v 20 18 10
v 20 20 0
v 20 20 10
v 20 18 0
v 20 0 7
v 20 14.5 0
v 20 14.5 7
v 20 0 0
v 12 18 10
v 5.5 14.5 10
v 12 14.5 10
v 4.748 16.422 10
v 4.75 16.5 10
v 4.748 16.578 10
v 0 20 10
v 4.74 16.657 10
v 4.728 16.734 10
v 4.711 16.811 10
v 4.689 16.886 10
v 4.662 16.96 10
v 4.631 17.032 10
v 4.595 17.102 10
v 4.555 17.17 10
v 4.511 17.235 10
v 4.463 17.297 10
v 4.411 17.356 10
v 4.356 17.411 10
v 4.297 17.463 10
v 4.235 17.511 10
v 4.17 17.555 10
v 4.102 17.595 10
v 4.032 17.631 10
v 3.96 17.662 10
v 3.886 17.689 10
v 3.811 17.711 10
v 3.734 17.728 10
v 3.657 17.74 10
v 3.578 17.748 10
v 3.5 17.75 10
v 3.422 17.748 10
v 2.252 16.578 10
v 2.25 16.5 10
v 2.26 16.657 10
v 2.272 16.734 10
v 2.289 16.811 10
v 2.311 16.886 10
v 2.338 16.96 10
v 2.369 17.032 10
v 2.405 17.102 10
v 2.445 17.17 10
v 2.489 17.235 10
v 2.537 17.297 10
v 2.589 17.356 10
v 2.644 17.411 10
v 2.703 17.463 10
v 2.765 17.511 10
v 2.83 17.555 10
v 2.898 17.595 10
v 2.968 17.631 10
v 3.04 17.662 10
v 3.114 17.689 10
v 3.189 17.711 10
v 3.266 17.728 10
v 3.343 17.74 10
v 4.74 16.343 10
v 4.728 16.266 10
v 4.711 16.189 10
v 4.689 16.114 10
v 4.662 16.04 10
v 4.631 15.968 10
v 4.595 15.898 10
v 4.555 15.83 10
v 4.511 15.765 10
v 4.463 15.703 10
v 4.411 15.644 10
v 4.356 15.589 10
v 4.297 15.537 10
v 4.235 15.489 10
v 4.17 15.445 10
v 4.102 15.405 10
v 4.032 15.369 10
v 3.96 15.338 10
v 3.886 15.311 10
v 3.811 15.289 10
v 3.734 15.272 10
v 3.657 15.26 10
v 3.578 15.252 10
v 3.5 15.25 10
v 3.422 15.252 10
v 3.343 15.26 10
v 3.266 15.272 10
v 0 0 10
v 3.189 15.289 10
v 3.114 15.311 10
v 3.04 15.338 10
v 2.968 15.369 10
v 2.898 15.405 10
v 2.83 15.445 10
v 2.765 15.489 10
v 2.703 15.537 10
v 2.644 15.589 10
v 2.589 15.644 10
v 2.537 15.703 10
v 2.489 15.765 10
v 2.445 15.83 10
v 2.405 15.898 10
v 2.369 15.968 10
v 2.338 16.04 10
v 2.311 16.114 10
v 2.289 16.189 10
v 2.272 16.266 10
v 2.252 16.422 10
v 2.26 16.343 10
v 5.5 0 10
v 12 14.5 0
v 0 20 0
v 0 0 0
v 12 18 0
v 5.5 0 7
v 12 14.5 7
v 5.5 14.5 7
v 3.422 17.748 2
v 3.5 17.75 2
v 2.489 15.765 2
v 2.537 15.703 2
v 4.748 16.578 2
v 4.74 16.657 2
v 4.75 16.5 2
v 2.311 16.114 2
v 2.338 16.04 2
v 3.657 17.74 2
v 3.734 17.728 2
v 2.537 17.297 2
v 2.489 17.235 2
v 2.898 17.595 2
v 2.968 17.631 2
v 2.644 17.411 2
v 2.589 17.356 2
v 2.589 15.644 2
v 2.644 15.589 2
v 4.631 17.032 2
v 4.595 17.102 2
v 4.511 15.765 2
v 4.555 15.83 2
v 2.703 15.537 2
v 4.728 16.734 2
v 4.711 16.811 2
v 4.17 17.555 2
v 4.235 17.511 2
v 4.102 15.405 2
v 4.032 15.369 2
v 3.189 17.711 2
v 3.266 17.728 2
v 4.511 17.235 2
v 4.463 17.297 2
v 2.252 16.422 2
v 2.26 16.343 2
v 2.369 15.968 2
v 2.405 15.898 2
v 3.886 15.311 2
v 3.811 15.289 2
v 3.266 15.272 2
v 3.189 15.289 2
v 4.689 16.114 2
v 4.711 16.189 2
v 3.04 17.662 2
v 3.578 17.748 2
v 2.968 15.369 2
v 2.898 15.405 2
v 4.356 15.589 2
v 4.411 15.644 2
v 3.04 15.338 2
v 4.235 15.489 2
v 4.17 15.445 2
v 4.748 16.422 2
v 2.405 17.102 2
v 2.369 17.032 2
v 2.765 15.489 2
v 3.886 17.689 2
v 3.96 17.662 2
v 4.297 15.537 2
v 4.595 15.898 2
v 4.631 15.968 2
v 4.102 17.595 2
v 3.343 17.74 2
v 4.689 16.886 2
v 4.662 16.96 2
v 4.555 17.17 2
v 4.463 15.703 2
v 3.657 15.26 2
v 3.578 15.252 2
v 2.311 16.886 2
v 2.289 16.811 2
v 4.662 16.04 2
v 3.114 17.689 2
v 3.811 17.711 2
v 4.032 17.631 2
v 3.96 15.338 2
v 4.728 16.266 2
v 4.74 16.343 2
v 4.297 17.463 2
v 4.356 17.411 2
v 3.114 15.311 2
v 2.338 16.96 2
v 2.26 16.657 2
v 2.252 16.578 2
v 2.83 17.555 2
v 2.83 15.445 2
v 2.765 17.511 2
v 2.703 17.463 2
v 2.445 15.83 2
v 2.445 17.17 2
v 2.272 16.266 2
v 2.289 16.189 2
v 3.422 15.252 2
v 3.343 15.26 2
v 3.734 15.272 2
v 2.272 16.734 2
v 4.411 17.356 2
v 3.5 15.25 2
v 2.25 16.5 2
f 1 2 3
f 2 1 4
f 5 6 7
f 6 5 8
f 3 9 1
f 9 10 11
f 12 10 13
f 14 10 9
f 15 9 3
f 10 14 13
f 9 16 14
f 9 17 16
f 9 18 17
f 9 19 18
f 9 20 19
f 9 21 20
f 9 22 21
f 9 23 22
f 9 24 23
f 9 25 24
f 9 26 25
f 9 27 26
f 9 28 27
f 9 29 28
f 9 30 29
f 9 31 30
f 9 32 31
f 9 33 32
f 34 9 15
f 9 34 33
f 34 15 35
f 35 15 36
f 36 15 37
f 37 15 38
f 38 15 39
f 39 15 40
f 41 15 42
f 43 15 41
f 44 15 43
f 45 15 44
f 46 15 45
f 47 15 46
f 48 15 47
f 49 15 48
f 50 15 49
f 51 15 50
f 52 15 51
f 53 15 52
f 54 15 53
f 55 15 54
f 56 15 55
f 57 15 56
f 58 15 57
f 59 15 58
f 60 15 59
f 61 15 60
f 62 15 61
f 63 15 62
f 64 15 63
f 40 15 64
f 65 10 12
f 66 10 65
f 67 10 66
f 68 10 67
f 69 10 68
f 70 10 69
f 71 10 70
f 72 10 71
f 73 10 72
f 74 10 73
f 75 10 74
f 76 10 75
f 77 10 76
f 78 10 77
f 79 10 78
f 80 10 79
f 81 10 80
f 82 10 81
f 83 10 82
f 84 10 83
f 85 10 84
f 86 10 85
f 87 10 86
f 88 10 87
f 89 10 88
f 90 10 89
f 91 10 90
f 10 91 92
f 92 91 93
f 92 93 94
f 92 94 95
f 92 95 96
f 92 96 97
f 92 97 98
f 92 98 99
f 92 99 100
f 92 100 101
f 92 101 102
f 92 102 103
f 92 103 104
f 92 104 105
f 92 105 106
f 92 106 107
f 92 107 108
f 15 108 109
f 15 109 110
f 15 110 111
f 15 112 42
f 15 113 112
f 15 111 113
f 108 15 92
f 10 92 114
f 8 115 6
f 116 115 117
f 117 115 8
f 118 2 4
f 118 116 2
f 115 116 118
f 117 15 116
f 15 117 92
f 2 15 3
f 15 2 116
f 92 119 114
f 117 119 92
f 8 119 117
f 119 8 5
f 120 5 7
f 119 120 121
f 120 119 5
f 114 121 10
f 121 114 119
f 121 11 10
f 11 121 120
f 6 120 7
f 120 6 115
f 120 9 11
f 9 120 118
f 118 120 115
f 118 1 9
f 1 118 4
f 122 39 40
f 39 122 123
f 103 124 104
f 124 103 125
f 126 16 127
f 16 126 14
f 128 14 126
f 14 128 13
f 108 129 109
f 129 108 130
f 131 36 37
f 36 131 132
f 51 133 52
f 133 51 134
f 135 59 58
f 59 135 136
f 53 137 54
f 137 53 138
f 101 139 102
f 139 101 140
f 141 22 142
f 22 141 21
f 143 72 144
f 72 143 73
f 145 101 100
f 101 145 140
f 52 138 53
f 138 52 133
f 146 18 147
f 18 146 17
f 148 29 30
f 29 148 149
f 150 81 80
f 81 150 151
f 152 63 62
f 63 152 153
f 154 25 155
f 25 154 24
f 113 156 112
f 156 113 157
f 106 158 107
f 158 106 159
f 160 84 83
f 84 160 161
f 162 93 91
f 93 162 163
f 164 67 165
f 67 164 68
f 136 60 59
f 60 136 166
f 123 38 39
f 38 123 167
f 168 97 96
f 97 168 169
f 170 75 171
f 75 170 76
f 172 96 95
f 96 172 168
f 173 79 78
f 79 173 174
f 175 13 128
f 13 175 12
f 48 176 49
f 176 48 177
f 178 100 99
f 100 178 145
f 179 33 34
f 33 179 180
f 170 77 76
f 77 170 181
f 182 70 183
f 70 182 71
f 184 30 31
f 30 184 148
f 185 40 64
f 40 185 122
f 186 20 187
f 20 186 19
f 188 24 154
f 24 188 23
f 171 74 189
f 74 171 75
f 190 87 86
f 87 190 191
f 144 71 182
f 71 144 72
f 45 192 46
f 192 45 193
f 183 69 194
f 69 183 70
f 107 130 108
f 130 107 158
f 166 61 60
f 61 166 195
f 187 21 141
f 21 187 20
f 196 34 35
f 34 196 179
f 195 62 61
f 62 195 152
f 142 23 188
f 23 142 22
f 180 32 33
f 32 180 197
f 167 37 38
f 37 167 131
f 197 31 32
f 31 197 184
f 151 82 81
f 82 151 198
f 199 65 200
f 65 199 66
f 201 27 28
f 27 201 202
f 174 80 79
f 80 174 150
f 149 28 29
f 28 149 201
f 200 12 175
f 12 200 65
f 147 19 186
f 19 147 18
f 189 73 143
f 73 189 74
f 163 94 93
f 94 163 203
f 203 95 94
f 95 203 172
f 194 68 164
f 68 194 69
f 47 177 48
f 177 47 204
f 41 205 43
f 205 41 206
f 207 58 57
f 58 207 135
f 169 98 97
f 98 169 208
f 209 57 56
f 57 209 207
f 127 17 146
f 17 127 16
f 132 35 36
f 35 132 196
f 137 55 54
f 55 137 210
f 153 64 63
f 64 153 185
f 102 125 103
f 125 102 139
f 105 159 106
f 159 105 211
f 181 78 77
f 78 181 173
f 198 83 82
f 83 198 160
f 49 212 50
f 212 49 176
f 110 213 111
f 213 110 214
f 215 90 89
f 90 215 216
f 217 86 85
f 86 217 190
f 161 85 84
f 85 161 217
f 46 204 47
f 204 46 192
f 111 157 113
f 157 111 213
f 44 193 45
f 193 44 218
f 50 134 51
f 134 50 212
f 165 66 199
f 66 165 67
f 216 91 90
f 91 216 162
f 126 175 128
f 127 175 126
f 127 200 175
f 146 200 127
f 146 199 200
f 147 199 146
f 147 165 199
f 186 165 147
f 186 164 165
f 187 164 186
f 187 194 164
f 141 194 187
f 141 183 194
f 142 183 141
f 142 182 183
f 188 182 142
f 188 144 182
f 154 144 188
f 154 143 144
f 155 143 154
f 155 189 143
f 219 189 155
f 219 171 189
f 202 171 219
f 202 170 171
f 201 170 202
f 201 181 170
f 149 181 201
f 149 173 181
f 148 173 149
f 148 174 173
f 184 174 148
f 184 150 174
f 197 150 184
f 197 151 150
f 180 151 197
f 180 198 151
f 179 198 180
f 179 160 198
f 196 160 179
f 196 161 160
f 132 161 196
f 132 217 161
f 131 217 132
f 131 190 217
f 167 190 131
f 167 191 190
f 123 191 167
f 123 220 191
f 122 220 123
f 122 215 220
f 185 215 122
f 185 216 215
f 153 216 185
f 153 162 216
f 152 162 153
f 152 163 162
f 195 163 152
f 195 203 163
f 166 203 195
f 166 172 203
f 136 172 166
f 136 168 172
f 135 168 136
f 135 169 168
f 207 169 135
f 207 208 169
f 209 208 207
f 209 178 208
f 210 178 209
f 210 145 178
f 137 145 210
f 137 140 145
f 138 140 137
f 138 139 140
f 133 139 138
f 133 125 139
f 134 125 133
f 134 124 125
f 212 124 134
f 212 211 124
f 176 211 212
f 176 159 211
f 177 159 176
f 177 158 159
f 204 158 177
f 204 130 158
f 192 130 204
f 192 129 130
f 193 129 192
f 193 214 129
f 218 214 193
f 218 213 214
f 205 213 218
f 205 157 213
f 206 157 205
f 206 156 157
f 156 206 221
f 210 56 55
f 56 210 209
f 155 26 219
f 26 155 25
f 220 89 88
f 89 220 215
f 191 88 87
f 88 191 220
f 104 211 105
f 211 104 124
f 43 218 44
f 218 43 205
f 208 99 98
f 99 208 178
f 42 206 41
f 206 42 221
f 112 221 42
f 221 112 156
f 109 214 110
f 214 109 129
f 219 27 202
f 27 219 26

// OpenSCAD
widthX = 20;

widthY = 20;

height = 10;

wallWidth = 3;

outerWidth = 5;

difference() {
    cube([widthX, widthY, height]);

    translate([outerWidth + 0.5, -1, height - wallWidth ]) {
        cube([widthX + 1, widthY - outerWidth + 0.5, wallWidth + 2]);
    }

       translate([widthX - 8, widthY - outerWidth - 0.5, 0 ]) {
        cube([8, 3.5, 20]);
    }

    // Join holes
    translate([3.5 , widthY - 3.5, 2]) {
        cylinder(r=1.25, h=11, $fn=100);
    }
}
